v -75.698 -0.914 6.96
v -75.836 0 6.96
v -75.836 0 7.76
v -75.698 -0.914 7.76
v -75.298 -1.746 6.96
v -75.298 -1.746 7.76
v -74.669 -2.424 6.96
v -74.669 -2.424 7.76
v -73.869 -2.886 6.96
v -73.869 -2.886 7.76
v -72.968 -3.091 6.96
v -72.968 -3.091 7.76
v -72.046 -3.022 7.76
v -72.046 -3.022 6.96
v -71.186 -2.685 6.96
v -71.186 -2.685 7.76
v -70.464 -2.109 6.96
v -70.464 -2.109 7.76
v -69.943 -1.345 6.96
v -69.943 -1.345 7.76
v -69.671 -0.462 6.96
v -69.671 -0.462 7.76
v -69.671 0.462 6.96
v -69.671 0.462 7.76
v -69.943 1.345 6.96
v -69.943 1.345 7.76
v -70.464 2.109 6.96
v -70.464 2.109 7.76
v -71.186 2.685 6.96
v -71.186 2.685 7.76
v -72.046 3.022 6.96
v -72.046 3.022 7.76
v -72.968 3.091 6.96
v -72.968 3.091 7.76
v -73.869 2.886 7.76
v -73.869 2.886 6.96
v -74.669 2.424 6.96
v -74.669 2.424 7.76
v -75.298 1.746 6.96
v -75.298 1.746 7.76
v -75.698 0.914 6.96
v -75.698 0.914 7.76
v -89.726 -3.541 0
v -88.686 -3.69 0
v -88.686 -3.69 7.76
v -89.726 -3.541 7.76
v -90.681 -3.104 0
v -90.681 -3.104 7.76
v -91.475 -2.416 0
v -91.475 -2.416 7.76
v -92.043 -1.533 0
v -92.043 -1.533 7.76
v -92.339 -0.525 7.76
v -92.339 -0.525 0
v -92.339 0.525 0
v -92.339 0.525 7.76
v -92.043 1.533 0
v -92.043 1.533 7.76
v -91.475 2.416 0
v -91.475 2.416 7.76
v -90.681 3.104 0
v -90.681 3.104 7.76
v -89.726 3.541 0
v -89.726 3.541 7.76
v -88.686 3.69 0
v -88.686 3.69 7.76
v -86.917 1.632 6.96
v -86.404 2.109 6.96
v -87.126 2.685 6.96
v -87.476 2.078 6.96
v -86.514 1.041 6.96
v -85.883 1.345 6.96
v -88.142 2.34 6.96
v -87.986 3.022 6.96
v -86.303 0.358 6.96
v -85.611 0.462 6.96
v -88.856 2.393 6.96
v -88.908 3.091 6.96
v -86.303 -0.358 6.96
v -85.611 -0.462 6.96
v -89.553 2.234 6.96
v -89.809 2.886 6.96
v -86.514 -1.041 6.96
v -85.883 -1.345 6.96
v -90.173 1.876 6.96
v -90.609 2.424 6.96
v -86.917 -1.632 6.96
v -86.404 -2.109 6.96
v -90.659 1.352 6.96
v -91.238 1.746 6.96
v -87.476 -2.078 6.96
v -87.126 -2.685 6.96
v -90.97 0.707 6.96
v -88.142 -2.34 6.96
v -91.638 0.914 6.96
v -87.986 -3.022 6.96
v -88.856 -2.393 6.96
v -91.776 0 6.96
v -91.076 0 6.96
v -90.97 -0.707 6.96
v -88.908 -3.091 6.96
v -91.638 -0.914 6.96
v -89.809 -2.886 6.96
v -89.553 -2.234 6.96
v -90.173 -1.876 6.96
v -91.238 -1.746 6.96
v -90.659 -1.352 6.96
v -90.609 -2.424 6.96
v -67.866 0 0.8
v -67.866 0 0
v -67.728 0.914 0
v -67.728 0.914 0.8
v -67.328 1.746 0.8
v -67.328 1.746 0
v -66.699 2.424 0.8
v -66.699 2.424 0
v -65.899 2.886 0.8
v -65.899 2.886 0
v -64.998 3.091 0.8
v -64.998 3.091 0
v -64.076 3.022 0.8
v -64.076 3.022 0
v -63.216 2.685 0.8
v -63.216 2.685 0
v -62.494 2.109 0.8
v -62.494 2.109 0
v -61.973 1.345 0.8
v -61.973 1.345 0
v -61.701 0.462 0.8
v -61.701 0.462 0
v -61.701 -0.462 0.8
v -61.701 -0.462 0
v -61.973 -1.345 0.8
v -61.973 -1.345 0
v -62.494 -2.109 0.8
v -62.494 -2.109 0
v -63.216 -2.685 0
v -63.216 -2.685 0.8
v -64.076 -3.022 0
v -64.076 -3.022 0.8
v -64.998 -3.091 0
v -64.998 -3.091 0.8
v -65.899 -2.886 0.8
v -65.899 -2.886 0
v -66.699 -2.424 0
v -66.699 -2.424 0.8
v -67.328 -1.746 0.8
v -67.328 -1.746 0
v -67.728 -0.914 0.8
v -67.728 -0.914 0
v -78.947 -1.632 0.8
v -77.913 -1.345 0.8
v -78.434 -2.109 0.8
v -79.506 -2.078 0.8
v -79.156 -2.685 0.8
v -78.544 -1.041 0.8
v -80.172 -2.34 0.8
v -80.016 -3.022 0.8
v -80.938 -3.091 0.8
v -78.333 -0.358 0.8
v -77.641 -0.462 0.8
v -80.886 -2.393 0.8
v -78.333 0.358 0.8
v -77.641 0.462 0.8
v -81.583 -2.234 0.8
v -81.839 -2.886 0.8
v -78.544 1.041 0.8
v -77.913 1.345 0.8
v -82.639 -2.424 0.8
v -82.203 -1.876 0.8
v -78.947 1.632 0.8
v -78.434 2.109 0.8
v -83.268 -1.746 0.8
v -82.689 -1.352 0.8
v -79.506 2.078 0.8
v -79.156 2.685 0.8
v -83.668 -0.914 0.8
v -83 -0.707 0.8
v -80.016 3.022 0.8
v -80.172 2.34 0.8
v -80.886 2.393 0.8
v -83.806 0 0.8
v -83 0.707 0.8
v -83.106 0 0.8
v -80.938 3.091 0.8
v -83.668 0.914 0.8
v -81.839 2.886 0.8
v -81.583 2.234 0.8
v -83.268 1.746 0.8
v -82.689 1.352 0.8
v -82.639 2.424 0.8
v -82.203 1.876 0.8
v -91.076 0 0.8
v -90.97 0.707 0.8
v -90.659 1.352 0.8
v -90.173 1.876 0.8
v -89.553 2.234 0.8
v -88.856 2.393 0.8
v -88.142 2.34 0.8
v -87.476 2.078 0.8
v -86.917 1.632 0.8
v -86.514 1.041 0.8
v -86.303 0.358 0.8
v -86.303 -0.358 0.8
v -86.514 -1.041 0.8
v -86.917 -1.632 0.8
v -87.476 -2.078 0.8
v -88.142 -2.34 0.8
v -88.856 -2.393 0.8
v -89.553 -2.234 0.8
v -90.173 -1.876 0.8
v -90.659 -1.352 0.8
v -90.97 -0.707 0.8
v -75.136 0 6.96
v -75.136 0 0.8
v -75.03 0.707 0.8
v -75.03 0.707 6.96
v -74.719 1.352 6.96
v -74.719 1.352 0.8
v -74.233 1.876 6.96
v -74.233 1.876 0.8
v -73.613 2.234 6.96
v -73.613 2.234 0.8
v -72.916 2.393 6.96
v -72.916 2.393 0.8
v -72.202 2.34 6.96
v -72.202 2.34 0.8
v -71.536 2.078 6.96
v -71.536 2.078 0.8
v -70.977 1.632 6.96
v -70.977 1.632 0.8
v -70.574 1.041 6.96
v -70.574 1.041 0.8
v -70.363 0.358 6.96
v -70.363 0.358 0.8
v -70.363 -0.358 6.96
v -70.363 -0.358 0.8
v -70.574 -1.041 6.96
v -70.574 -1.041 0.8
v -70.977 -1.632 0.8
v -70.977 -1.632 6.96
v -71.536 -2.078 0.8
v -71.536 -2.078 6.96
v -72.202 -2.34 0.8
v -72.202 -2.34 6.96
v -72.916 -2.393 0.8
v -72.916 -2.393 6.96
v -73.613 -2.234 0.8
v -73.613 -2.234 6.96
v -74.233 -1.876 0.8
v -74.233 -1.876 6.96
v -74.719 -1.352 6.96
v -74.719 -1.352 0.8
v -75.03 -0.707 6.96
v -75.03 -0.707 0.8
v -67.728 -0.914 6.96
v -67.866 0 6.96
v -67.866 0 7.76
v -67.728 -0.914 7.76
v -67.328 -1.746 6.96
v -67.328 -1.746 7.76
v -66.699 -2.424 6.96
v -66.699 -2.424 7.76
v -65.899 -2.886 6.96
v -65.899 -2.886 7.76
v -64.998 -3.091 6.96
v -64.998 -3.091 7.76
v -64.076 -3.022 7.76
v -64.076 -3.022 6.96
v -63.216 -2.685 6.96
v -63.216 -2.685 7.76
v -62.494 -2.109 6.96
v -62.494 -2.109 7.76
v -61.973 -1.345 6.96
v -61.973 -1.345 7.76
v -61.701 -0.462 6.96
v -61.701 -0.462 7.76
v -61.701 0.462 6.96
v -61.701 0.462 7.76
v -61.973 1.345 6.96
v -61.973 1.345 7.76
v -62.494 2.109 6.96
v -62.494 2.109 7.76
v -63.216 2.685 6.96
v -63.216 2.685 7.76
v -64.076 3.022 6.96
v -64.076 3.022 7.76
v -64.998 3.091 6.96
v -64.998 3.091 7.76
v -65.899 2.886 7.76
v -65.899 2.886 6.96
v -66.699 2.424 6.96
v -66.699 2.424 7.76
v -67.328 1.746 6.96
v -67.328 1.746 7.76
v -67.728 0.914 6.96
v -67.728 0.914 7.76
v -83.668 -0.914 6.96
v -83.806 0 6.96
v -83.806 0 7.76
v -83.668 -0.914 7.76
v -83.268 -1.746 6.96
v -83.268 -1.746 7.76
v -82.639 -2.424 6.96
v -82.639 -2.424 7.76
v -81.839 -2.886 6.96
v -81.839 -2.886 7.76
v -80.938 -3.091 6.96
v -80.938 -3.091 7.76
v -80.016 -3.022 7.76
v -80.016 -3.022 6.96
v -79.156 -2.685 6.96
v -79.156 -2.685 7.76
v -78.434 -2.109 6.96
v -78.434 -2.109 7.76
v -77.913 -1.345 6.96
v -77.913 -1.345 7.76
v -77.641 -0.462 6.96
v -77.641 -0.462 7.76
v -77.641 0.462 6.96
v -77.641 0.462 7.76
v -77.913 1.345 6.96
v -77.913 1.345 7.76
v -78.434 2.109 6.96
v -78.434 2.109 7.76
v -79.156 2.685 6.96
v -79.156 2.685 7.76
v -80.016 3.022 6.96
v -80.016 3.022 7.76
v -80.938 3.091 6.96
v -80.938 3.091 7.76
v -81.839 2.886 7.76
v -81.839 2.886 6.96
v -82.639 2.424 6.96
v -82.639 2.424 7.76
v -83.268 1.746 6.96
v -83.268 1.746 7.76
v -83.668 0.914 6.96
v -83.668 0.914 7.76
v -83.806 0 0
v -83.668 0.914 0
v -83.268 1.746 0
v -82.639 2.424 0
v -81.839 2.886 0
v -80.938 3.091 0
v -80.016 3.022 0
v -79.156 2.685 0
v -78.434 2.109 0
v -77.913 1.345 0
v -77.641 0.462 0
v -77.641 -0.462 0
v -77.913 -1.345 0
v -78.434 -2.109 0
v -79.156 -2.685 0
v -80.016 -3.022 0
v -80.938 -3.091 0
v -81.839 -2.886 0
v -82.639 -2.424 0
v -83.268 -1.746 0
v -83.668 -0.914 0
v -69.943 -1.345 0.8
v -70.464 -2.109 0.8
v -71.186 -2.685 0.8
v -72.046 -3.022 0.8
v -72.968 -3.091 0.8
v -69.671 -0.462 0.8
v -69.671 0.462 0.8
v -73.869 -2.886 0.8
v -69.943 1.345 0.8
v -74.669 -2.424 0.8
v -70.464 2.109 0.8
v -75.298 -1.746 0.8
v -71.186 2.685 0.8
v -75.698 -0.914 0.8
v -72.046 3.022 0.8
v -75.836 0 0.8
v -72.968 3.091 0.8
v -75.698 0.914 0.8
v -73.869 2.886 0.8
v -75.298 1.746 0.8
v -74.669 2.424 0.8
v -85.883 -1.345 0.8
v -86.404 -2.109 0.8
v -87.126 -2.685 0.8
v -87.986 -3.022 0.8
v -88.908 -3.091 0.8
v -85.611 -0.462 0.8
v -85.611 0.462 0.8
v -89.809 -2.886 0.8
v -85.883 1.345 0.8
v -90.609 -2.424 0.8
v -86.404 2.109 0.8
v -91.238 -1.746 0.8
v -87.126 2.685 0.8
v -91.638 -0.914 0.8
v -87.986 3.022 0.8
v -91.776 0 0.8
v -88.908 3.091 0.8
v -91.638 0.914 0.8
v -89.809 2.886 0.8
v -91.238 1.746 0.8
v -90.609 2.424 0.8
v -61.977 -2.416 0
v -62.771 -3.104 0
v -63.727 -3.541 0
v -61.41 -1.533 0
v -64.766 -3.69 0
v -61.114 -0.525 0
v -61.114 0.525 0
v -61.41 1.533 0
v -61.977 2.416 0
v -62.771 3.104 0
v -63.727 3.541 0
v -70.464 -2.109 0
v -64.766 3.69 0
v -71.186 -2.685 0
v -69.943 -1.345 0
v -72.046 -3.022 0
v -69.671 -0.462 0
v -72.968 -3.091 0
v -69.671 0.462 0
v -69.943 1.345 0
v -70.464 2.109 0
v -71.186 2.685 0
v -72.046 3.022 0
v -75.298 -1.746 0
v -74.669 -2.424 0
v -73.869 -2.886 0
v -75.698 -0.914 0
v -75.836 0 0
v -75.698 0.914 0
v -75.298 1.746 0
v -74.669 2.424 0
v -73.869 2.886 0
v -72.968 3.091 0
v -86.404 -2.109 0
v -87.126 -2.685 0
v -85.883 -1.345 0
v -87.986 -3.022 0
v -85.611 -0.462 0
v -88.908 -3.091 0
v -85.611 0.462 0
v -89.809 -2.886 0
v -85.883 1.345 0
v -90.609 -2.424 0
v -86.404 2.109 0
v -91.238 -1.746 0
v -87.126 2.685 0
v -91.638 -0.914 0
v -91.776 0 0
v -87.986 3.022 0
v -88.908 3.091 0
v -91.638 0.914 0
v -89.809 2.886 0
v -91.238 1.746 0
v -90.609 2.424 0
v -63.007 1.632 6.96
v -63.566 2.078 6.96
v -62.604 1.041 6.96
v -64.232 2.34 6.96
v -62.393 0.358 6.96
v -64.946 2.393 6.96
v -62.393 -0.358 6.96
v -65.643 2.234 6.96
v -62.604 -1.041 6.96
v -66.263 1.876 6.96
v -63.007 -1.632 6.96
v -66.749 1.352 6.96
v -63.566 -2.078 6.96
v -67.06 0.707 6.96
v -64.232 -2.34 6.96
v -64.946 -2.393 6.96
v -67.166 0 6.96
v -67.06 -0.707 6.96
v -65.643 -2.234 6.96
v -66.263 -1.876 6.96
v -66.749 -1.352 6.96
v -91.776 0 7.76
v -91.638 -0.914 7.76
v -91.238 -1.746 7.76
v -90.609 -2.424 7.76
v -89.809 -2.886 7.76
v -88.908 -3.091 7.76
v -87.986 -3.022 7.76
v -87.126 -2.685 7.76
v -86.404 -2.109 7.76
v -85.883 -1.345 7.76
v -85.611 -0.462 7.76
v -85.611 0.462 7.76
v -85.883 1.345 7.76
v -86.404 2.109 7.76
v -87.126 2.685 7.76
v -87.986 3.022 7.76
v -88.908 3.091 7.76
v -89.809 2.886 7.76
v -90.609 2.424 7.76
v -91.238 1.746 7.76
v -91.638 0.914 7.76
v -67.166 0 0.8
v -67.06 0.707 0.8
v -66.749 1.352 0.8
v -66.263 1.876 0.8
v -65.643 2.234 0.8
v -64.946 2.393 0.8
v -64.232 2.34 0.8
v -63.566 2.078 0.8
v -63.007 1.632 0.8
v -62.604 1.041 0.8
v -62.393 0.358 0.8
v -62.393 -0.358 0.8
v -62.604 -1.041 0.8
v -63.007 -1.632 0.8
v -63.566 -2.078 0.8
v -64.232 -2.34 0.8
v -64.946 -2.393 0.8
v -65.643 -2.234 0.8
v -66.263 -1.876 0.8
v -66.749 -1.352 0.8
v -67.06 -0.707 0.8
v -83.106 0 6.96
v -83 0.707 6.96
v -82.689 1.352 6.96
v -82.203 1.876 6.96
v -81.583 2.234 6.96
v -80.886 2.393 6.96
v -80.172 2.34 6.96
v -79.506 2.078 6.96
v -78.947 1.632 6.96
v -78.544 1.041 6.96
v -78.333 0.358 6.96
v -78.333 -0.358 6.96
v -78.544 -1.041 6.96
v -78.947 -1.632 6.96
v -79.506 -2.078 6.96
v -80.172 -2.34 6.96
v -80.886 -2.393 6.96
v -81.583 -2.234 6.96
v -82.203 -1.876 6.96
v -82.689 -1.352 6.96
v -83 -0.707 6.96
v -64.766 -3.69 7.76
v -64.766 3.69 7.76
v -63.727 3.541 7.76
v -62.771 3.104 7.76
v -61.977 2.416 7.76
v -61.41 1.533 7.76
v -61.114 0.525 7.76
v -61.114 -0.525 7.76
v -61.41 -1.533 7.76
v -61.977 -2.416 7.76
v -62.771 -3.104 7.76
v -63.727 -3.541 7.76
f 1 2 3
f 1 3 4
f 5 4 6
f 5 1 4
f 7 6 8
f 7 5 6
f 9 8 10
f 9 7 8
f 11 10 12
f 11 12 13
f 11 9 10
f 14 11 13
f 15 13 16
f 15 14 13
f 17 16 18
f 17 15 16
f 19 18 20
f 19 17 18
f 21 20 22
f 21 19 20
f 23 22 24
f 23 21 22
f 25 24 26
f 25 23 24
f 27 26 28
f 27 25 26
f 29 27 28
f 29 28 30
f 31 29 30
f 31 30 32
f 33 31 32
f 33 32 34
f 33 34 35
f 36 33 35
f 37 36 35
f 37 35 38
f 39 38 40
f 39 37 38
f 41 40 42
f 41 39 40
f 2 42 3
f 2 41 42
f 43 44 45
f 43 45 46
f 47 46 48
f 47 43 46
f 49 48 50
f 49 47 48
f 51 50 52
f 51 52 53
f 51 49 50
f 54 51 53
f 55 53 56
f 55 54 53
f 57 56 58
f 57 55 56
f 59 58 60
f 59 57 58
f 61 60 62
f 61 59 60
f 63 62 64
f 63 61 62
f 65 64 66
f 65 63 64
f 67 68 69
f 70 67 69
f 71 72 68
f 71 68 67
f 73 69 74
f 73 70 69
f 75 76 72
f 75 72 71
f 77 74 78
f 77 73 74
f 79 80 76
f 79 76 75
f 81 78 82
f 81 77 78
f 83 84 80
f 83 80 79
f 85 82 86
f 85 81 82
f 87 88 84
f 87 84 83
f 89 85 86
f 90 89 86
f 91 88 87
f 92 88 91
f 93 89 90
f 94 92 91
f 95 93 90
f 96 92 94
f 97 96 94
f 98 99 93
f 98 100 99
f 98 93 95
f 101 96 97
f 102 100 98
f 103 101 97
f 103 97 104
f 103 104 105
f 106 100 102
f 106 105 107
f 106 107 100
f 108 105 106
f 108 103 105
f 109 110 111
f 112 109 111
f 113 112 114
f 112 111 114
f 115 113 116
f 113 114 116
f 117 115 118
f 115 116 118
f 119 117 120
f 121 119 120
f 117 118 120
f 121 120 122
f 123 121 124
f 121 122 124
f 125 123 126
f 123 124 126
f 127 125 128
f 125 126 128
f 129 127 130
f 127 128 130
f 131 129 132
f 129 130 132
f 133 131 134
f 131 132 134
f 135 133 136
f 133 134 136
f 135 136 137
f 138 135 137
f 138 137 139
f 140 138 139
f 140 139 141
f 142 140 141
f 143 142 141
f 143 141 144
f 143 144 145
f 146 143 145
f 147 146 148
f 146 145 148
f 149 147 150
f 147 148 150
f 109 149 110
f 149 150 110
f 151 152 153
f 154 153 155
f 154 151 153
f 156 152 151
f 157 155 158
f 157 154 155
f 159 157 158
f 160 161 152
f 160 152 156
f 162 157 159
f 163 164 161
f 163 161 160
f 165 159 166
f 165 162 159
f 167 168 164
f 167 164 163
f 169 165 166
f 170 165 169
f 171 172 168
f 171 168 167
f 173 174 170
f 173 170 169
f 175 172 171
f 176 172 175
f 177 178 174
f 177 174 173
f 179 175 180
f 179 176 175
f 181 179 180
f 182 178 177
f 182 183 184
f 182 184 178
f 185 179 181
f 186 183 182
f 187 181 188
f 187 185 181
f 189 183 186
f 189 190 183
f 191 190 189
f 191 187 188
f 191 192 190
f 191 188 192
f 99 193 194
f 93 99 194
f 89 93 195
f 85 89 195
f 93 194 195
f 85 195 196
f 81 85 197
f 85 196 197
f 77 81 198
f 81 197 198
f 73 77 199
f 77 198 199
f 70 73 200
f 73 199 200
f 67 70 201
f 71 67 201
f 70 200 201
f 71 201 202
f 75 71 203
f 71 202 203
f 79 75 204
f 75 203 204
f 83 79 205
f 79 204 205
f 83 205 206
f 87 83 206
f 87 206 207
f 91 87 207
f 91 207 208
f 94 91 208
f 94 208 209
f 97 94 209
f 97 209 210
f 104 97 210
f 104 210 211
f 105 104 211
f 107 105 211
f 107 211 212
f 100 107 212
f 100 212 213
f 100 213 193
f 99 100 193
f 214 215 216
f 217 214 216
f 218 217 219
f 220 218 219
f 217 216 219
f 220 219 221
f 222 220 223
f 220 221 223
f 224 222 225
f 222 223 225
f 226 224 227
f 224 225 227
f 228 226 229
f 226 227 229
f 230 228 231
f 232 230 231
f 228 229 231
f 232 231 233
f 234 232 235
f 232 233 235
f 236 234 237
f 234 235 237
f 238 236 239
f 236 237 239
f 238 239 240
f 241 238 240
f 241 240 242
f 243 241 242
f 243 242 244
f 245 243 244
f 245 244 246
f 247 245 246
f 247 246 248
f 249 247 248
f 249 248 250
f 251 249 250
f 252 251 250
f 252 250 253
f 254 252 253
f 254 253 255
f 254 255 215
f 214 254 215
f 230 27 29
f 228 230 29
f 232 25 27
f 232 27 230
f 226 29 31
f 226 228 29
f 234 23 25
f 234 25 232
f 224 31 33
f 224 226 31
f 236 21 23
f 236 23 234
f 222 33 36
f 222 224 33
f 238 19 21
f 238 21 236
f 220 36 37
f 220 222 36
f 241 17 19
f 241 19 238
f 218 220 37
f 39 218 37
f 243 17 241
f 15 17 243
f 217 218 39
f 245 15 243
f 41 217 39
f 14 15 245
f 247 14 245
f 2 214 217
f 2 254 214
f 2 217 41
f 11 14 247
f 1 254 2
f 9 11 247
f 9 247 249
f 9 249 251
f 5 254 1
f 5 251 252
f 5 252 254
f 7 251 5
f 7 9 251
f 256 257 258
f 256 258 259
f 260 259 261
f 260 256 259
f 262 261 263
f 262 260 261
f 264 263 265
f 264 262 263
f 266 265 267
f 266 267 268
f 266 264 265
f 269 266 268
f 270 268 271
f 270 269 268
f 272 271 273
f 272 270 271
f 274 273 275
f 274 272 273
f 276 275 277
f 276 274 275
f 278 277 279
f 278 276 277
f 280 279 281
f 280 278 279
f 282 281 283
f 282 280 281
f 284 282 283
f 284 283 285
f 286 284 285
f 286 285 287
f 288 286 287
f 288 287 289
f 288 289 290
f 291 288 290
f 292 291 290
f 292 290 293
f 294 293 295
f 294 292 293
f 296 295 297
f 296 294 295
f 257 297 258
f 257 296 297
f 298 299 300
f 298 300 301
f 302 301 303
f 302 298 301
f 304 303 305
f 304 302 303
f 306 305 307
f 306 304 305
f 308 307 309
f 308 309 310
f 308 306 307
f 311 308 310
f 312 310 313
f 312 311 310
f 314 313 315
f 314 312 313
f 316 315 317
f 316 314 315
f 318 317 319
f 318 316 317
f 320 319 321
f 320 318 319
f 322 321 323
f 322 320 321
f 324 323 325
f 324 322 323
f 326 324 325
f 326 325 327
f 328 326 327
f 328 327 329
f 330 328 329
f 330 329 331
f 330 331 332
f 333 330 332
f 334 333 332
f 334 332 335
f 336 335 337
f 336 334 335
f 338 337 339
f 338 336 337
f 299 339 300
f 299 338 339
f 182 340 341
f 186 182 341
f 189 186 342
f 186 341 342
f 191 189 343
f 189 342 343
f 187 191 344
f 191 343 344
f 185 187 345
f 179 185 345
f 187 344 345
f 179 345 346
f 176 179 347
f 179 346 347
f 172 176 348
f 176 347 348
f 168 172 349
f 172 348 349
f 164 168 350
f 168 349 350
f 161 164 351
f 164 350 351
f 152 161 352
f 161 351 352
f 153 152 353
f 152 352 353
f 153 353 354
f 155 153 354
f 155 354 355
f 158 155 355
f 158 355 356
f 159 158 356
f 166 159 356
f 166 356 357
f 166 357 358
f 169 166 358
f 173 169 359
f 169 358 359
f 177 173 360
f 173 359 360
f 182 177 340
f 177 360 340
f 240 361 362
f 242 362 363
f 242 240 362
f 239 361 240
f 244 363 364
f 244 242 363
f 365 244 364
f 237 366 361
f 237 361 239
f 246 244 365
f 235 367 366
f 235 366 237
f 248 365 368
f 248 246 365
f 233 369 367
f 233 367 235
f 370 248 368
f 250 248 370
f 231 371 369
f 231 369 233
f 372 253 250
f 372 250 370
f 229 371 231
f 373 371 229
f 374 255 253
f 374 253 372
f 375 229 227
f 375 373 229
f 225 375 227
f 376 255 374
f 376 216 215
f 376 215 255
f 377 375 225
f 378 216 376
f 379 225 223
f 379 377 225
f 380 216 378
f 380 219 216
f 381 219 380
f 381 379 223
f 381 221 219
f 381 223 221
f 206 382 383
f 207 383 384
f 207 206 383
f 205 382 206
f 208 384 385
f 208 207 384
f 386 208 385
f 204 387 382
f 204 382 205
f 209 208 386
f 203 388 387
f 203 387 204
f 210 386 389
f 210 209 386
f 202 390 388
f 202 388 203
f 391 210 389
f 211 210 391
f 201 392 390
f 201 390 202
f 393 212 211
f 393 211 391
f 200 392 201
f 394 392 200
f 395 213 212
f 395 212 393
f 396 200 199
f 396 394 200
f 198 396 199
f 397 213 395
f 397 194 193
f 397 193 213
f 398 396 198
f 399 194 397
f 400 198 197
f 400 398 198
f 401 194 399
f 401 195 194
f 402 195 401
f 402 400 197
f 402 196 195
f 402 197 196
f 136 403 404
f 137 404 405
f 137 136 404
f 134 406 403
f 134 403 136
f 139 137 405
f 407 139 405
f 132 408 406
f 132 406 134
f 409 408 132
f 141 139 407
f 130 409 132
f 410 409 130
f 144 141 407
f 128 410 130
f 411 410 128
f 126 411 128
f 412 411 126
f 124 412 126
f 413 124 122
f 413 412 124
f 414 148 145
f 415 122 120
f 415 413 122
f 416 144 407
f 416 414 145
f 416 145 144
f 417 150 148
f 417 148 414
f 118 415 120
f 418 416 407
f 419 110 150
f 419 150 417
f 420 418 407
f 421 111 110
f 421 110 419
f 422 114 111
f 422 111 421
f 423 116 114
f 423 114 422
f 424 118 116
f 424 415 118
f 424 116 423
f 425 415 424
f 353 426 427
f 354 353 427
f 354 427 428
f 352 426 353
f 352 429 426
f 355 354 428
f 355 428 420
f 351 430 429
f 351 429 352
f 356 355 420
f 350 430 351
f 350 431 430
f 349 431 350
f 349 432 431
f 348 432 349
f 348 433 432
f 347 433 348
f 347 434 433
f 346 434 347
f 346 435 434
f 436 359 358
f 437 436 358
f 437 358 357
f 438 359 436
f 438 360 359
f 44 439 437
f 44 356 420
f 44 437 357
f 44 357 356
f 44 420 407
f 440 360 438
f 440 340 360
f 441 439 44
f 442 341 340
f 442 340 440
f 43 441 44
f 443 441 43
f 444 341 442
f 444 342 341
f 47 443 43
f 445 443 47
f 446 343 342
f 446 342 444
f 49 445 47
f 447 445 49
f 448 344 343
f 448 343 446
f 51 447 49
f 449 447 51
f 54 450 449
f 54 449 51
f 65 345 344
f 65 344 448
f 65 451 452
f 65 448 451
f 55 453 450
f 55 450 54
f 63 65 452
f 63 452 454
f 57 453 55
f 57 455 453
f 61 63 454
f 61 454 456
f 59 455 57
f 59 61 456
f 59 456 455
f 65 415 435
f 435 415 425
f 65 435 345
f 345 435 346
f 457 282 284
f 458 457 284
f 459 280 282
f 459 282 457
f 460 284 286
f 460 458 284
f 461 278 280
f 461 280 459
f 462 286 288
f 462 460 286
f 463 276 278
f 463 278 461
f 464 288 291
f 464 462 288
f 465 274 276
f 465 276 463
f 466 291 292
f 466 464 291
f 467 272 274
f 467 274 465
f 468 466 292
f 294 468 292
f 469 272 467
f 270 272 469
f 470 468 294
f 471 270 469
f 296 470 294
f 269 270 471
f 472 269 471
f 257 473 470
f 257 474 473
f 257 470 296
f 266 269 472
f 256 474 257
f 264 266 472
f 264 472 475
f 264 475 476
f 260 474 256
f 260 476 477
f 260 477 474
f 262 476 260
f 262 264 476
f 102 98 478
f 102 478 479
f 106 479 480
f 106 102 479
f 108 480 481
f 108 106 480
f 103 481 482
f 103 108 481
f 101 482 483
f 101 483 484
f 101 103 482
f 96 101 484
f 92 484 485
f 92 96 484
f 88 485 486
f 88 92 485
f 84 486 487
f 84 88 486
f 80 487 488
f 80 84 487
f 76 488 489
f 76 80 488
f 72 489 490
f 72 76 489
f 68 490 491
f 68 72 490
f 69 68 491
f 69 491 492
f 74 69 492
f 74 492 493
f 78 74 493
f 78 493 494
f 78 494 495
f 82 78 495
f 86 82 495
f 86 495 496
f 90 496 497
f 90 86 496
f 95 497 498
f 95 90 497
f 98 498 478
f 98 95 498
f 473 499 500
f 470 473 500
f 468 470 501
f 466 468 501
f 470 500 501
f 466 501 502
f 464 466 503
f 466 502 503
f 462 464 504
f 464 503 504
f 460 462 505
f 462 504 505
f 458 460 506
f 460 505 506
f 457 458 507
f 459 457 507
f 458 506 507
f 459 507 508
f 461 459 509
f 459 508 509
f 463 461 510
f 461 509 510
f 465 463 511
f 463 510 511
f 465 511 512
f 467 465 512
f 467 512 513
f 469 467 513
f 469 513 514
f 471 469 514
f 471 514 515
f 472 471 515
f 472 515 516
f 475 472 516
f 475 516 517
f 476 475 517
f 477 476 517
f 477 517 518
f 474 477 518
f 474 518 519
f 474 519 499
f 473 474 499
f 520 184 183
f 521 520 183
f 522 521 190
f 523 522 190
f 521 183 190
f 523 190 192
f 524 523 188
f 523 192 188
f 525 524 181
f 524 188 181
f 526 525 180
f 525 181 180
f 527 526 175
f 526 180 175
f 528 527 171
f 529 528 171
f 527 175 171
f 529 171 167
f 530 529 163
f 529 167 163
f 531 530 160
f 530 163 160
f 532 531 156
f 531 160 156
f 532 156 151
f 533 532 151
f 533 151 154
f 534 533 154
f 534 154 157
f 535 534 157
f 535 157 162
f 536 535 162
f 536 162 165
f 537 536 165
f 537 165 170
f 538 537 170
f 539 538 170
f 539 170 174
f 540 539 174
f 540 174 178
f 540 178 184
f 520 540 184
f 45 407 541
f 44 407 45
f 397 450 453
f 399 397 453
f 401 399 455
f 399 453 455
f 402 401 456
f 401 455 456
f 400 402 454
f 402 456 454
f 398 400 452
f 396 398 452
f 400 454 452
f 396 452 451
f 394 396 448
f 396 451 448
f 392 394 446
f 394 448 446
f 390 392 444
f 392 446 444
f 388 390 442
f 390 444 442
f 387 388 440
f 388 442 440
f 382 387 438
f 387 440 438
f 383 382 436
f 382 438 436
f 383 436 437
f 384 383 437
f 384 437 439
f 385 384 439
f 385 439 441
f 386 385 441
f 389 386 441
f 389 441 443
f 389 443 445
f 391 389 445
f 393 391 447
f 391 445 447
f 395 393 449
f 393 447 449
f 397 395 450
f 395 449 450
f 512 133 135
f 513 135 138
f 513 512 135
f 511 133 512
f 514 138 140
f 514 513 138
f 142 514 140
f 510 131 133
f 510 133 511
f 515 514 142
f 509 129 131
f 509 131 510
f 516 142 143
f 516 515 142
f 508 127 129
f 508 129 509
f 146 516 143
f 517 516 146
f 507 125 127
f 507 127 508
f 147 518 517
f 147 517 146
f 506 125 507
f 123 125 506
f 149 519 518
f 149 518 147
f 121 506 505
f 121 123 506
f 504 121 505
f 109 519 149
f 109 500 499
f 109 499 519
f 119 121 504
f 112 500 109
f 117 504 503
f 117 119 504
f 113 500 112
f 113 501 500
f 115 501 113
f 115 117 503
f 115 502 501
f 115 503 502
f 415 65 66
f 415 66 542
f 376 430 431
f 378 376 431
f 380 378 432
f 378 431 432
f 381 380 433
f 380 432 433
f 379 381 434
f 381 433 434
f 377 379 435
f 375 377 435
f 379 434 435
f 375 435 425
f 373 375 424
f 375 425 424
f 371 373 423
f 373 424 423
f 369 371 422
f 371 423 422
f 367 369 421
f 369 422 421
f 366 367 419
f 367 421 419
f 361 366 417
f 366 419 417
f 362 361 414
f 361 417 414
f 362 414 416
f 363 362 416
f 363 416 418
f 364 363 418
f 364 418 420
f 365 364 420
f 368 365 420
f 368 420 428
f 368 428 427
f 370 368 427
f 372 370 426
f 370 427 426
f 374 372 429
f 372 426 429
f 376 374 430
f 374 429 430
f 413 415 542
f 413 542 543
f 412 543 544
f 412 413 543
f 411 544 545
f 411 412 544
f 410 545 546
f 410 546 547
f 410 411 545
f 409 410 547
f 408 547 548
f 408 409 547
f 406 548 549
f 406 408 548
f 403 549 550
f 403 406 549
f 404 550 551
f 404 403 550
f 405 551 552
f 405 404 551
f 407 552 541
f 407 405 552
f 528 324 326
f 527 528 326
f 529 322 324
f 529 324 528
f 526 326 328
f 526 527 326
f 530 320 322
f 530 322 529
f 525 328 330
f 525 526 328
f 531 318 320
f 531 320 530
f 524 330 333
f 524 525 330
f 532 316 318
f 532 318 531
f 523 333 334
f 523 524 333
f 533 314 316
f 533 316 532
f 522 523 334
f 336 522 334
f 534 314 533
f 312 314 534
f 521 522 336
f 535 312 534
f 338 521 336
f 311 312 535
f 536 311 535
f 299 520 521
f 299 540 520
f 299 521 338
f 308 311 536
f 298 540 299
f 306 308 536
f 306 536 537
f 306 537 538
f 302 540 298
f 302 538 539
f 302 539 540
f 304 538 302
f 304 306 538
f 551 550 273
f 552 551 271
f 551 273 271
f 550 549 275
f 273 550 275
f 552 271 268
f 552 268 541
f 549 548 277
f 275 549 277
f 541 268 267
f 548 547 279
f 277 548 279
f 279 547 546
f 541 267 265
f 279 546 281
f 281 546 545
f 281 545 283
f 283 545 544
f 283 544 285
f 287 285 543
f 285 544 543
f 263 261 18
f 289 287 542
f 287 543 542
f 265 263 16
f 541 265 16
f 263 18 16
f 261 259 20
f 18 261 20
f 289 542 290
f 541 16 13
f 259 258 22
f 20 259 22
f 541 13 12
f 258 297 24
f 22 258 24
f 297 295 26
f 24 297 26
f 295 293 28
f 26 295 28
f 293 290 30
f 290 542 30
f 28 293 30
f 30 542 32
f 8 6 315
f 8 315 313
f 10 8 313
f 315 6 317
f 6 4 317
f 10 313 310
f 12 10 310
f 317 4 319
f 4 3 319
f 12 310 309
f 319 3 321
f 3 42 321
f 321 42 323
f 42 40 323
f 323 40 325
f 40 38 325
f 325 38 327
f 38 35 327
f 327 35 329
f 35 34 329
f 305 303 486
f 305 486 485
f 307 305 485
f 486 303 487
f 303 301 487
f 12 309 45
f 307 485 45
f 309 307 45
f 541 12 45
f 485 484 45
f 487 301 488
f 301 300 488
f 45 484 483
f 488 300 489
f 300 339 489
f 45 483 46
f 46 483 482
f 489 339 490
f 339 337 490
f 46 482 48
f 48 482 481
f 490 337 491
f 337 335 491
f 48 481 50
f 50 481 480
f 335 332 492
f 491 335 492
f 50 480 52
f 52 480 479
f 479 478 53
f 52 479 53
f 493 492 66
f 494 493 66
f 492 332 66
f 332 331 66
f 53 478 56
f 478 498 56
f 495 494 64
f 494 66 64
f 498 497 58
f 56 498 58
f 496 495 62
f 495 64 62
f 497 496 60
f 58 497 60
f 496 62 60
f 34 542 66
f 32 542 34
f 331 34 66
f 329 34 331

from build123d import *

# Parameters (mm, degrees)
BOSS_EXTRUDE1_DEPTH = 7.76
SKETCH2_R           = 3.1
CUT_EXTRUDE1_DEPTH  = 0.8
SKETCH3_R           = 2.4
CUT_EXTRUDE2_DEPTH  = 93.711483407
CUT_EXTRUDE3_START  = -0.8
SKETCH4_R           = 3.1
CUT_EXTRUDE3_DEPTH  = 0.8


with BuildPart() as part:
    # Sketch1 → Boss-Extrude1 (new body)
    with BuildSketch(Plane.XY):
        with BuildLine():
            Line((-88.686195286, 3.69), (-64.766195286, 3.69))
            ThreePointArc((-64.766195286, 3.69), (-61.076195286, 0), (-64.766195286, -3.69))
            Line((-64.766195286, -3.69), (-88.686195286, -3.69))
            ThreePointArc((-88.686195286, -3.69), (-92.376195286, 0), (-88.686195286, 3.69))
        make_face()
    extrude(amount=BOSS_EXTRUDE1_DEPTH)

    # Sketch2 → Cut-Extrude1 (cut)
    with BuildSketch(Plane(origin=(0, 0, 0), x_dir=(-1, 0, 0), z_dir=(0, 0, -1))):
        with Locations((64.766195286, 0)):
            Circle(SKETCH2_R)
        with Locations((72.736195286, 0)):
            Circle(SKETCH2_R)
        with Locations((80.706195286, 0)):
            Circle(SKETCH2_R)
        with Locations((88.676195286, 0)):
            Circle(SKETCH2_R)
    extrude(amount=-CUT_EXTRUDE1_DEPTH, mode=Mode.SUBTRACT)

    # Sketch3 → Cut-Extrude2 (cut, through all)
    with BuildSketch(Plane(origin=(0, 0, 0.8), x_dir=(-1, 0, 0), z_dir=(0, 0, -1))):
        with Locations((64.766195286, 0)):
            Circle(SKETCH3_R)
        with Locations((72.736195286, 0)):
            Circle(SKETCH3_R)
        with Locations((80.706195286, 0)):
            Circle(SKETCH3_R)
        with Locations((88.676195286, 0)):
            Circle(SKETCH3_R)
    extrude(amount=-CUT_EXTRUDE2_DEPTH, mode=Mode.SUBTRACT)

    # Sketch4 → Cut-Extrude3 (cut)
    with BuildSketch(Plane.XY.offset(7.76).offset(CUT_EXTRUDE3_START)):
        with Locations(Location((-88.676195286, 0, 0), (0, 0, 180))):
            Circle(SKETCH4_R)
        with Locations(Location((-80.706195286, 0, 0), (0, 0, 180))):
            Circle(SKETCH4_R)
        with Locations(Location((-72.736195286, 0, 0), (0, 0, 180))):
            Circle(SKETCH4_R)
        with Locations(Location((-64.766195286, 0, 0), (0, 0, 180))):
            Circle(SKETCH4_R)
    extrude(amount=CUT_EXTRUDE3_DEPTH, mode=Mode.SUBTRACT)


solid = part.part
